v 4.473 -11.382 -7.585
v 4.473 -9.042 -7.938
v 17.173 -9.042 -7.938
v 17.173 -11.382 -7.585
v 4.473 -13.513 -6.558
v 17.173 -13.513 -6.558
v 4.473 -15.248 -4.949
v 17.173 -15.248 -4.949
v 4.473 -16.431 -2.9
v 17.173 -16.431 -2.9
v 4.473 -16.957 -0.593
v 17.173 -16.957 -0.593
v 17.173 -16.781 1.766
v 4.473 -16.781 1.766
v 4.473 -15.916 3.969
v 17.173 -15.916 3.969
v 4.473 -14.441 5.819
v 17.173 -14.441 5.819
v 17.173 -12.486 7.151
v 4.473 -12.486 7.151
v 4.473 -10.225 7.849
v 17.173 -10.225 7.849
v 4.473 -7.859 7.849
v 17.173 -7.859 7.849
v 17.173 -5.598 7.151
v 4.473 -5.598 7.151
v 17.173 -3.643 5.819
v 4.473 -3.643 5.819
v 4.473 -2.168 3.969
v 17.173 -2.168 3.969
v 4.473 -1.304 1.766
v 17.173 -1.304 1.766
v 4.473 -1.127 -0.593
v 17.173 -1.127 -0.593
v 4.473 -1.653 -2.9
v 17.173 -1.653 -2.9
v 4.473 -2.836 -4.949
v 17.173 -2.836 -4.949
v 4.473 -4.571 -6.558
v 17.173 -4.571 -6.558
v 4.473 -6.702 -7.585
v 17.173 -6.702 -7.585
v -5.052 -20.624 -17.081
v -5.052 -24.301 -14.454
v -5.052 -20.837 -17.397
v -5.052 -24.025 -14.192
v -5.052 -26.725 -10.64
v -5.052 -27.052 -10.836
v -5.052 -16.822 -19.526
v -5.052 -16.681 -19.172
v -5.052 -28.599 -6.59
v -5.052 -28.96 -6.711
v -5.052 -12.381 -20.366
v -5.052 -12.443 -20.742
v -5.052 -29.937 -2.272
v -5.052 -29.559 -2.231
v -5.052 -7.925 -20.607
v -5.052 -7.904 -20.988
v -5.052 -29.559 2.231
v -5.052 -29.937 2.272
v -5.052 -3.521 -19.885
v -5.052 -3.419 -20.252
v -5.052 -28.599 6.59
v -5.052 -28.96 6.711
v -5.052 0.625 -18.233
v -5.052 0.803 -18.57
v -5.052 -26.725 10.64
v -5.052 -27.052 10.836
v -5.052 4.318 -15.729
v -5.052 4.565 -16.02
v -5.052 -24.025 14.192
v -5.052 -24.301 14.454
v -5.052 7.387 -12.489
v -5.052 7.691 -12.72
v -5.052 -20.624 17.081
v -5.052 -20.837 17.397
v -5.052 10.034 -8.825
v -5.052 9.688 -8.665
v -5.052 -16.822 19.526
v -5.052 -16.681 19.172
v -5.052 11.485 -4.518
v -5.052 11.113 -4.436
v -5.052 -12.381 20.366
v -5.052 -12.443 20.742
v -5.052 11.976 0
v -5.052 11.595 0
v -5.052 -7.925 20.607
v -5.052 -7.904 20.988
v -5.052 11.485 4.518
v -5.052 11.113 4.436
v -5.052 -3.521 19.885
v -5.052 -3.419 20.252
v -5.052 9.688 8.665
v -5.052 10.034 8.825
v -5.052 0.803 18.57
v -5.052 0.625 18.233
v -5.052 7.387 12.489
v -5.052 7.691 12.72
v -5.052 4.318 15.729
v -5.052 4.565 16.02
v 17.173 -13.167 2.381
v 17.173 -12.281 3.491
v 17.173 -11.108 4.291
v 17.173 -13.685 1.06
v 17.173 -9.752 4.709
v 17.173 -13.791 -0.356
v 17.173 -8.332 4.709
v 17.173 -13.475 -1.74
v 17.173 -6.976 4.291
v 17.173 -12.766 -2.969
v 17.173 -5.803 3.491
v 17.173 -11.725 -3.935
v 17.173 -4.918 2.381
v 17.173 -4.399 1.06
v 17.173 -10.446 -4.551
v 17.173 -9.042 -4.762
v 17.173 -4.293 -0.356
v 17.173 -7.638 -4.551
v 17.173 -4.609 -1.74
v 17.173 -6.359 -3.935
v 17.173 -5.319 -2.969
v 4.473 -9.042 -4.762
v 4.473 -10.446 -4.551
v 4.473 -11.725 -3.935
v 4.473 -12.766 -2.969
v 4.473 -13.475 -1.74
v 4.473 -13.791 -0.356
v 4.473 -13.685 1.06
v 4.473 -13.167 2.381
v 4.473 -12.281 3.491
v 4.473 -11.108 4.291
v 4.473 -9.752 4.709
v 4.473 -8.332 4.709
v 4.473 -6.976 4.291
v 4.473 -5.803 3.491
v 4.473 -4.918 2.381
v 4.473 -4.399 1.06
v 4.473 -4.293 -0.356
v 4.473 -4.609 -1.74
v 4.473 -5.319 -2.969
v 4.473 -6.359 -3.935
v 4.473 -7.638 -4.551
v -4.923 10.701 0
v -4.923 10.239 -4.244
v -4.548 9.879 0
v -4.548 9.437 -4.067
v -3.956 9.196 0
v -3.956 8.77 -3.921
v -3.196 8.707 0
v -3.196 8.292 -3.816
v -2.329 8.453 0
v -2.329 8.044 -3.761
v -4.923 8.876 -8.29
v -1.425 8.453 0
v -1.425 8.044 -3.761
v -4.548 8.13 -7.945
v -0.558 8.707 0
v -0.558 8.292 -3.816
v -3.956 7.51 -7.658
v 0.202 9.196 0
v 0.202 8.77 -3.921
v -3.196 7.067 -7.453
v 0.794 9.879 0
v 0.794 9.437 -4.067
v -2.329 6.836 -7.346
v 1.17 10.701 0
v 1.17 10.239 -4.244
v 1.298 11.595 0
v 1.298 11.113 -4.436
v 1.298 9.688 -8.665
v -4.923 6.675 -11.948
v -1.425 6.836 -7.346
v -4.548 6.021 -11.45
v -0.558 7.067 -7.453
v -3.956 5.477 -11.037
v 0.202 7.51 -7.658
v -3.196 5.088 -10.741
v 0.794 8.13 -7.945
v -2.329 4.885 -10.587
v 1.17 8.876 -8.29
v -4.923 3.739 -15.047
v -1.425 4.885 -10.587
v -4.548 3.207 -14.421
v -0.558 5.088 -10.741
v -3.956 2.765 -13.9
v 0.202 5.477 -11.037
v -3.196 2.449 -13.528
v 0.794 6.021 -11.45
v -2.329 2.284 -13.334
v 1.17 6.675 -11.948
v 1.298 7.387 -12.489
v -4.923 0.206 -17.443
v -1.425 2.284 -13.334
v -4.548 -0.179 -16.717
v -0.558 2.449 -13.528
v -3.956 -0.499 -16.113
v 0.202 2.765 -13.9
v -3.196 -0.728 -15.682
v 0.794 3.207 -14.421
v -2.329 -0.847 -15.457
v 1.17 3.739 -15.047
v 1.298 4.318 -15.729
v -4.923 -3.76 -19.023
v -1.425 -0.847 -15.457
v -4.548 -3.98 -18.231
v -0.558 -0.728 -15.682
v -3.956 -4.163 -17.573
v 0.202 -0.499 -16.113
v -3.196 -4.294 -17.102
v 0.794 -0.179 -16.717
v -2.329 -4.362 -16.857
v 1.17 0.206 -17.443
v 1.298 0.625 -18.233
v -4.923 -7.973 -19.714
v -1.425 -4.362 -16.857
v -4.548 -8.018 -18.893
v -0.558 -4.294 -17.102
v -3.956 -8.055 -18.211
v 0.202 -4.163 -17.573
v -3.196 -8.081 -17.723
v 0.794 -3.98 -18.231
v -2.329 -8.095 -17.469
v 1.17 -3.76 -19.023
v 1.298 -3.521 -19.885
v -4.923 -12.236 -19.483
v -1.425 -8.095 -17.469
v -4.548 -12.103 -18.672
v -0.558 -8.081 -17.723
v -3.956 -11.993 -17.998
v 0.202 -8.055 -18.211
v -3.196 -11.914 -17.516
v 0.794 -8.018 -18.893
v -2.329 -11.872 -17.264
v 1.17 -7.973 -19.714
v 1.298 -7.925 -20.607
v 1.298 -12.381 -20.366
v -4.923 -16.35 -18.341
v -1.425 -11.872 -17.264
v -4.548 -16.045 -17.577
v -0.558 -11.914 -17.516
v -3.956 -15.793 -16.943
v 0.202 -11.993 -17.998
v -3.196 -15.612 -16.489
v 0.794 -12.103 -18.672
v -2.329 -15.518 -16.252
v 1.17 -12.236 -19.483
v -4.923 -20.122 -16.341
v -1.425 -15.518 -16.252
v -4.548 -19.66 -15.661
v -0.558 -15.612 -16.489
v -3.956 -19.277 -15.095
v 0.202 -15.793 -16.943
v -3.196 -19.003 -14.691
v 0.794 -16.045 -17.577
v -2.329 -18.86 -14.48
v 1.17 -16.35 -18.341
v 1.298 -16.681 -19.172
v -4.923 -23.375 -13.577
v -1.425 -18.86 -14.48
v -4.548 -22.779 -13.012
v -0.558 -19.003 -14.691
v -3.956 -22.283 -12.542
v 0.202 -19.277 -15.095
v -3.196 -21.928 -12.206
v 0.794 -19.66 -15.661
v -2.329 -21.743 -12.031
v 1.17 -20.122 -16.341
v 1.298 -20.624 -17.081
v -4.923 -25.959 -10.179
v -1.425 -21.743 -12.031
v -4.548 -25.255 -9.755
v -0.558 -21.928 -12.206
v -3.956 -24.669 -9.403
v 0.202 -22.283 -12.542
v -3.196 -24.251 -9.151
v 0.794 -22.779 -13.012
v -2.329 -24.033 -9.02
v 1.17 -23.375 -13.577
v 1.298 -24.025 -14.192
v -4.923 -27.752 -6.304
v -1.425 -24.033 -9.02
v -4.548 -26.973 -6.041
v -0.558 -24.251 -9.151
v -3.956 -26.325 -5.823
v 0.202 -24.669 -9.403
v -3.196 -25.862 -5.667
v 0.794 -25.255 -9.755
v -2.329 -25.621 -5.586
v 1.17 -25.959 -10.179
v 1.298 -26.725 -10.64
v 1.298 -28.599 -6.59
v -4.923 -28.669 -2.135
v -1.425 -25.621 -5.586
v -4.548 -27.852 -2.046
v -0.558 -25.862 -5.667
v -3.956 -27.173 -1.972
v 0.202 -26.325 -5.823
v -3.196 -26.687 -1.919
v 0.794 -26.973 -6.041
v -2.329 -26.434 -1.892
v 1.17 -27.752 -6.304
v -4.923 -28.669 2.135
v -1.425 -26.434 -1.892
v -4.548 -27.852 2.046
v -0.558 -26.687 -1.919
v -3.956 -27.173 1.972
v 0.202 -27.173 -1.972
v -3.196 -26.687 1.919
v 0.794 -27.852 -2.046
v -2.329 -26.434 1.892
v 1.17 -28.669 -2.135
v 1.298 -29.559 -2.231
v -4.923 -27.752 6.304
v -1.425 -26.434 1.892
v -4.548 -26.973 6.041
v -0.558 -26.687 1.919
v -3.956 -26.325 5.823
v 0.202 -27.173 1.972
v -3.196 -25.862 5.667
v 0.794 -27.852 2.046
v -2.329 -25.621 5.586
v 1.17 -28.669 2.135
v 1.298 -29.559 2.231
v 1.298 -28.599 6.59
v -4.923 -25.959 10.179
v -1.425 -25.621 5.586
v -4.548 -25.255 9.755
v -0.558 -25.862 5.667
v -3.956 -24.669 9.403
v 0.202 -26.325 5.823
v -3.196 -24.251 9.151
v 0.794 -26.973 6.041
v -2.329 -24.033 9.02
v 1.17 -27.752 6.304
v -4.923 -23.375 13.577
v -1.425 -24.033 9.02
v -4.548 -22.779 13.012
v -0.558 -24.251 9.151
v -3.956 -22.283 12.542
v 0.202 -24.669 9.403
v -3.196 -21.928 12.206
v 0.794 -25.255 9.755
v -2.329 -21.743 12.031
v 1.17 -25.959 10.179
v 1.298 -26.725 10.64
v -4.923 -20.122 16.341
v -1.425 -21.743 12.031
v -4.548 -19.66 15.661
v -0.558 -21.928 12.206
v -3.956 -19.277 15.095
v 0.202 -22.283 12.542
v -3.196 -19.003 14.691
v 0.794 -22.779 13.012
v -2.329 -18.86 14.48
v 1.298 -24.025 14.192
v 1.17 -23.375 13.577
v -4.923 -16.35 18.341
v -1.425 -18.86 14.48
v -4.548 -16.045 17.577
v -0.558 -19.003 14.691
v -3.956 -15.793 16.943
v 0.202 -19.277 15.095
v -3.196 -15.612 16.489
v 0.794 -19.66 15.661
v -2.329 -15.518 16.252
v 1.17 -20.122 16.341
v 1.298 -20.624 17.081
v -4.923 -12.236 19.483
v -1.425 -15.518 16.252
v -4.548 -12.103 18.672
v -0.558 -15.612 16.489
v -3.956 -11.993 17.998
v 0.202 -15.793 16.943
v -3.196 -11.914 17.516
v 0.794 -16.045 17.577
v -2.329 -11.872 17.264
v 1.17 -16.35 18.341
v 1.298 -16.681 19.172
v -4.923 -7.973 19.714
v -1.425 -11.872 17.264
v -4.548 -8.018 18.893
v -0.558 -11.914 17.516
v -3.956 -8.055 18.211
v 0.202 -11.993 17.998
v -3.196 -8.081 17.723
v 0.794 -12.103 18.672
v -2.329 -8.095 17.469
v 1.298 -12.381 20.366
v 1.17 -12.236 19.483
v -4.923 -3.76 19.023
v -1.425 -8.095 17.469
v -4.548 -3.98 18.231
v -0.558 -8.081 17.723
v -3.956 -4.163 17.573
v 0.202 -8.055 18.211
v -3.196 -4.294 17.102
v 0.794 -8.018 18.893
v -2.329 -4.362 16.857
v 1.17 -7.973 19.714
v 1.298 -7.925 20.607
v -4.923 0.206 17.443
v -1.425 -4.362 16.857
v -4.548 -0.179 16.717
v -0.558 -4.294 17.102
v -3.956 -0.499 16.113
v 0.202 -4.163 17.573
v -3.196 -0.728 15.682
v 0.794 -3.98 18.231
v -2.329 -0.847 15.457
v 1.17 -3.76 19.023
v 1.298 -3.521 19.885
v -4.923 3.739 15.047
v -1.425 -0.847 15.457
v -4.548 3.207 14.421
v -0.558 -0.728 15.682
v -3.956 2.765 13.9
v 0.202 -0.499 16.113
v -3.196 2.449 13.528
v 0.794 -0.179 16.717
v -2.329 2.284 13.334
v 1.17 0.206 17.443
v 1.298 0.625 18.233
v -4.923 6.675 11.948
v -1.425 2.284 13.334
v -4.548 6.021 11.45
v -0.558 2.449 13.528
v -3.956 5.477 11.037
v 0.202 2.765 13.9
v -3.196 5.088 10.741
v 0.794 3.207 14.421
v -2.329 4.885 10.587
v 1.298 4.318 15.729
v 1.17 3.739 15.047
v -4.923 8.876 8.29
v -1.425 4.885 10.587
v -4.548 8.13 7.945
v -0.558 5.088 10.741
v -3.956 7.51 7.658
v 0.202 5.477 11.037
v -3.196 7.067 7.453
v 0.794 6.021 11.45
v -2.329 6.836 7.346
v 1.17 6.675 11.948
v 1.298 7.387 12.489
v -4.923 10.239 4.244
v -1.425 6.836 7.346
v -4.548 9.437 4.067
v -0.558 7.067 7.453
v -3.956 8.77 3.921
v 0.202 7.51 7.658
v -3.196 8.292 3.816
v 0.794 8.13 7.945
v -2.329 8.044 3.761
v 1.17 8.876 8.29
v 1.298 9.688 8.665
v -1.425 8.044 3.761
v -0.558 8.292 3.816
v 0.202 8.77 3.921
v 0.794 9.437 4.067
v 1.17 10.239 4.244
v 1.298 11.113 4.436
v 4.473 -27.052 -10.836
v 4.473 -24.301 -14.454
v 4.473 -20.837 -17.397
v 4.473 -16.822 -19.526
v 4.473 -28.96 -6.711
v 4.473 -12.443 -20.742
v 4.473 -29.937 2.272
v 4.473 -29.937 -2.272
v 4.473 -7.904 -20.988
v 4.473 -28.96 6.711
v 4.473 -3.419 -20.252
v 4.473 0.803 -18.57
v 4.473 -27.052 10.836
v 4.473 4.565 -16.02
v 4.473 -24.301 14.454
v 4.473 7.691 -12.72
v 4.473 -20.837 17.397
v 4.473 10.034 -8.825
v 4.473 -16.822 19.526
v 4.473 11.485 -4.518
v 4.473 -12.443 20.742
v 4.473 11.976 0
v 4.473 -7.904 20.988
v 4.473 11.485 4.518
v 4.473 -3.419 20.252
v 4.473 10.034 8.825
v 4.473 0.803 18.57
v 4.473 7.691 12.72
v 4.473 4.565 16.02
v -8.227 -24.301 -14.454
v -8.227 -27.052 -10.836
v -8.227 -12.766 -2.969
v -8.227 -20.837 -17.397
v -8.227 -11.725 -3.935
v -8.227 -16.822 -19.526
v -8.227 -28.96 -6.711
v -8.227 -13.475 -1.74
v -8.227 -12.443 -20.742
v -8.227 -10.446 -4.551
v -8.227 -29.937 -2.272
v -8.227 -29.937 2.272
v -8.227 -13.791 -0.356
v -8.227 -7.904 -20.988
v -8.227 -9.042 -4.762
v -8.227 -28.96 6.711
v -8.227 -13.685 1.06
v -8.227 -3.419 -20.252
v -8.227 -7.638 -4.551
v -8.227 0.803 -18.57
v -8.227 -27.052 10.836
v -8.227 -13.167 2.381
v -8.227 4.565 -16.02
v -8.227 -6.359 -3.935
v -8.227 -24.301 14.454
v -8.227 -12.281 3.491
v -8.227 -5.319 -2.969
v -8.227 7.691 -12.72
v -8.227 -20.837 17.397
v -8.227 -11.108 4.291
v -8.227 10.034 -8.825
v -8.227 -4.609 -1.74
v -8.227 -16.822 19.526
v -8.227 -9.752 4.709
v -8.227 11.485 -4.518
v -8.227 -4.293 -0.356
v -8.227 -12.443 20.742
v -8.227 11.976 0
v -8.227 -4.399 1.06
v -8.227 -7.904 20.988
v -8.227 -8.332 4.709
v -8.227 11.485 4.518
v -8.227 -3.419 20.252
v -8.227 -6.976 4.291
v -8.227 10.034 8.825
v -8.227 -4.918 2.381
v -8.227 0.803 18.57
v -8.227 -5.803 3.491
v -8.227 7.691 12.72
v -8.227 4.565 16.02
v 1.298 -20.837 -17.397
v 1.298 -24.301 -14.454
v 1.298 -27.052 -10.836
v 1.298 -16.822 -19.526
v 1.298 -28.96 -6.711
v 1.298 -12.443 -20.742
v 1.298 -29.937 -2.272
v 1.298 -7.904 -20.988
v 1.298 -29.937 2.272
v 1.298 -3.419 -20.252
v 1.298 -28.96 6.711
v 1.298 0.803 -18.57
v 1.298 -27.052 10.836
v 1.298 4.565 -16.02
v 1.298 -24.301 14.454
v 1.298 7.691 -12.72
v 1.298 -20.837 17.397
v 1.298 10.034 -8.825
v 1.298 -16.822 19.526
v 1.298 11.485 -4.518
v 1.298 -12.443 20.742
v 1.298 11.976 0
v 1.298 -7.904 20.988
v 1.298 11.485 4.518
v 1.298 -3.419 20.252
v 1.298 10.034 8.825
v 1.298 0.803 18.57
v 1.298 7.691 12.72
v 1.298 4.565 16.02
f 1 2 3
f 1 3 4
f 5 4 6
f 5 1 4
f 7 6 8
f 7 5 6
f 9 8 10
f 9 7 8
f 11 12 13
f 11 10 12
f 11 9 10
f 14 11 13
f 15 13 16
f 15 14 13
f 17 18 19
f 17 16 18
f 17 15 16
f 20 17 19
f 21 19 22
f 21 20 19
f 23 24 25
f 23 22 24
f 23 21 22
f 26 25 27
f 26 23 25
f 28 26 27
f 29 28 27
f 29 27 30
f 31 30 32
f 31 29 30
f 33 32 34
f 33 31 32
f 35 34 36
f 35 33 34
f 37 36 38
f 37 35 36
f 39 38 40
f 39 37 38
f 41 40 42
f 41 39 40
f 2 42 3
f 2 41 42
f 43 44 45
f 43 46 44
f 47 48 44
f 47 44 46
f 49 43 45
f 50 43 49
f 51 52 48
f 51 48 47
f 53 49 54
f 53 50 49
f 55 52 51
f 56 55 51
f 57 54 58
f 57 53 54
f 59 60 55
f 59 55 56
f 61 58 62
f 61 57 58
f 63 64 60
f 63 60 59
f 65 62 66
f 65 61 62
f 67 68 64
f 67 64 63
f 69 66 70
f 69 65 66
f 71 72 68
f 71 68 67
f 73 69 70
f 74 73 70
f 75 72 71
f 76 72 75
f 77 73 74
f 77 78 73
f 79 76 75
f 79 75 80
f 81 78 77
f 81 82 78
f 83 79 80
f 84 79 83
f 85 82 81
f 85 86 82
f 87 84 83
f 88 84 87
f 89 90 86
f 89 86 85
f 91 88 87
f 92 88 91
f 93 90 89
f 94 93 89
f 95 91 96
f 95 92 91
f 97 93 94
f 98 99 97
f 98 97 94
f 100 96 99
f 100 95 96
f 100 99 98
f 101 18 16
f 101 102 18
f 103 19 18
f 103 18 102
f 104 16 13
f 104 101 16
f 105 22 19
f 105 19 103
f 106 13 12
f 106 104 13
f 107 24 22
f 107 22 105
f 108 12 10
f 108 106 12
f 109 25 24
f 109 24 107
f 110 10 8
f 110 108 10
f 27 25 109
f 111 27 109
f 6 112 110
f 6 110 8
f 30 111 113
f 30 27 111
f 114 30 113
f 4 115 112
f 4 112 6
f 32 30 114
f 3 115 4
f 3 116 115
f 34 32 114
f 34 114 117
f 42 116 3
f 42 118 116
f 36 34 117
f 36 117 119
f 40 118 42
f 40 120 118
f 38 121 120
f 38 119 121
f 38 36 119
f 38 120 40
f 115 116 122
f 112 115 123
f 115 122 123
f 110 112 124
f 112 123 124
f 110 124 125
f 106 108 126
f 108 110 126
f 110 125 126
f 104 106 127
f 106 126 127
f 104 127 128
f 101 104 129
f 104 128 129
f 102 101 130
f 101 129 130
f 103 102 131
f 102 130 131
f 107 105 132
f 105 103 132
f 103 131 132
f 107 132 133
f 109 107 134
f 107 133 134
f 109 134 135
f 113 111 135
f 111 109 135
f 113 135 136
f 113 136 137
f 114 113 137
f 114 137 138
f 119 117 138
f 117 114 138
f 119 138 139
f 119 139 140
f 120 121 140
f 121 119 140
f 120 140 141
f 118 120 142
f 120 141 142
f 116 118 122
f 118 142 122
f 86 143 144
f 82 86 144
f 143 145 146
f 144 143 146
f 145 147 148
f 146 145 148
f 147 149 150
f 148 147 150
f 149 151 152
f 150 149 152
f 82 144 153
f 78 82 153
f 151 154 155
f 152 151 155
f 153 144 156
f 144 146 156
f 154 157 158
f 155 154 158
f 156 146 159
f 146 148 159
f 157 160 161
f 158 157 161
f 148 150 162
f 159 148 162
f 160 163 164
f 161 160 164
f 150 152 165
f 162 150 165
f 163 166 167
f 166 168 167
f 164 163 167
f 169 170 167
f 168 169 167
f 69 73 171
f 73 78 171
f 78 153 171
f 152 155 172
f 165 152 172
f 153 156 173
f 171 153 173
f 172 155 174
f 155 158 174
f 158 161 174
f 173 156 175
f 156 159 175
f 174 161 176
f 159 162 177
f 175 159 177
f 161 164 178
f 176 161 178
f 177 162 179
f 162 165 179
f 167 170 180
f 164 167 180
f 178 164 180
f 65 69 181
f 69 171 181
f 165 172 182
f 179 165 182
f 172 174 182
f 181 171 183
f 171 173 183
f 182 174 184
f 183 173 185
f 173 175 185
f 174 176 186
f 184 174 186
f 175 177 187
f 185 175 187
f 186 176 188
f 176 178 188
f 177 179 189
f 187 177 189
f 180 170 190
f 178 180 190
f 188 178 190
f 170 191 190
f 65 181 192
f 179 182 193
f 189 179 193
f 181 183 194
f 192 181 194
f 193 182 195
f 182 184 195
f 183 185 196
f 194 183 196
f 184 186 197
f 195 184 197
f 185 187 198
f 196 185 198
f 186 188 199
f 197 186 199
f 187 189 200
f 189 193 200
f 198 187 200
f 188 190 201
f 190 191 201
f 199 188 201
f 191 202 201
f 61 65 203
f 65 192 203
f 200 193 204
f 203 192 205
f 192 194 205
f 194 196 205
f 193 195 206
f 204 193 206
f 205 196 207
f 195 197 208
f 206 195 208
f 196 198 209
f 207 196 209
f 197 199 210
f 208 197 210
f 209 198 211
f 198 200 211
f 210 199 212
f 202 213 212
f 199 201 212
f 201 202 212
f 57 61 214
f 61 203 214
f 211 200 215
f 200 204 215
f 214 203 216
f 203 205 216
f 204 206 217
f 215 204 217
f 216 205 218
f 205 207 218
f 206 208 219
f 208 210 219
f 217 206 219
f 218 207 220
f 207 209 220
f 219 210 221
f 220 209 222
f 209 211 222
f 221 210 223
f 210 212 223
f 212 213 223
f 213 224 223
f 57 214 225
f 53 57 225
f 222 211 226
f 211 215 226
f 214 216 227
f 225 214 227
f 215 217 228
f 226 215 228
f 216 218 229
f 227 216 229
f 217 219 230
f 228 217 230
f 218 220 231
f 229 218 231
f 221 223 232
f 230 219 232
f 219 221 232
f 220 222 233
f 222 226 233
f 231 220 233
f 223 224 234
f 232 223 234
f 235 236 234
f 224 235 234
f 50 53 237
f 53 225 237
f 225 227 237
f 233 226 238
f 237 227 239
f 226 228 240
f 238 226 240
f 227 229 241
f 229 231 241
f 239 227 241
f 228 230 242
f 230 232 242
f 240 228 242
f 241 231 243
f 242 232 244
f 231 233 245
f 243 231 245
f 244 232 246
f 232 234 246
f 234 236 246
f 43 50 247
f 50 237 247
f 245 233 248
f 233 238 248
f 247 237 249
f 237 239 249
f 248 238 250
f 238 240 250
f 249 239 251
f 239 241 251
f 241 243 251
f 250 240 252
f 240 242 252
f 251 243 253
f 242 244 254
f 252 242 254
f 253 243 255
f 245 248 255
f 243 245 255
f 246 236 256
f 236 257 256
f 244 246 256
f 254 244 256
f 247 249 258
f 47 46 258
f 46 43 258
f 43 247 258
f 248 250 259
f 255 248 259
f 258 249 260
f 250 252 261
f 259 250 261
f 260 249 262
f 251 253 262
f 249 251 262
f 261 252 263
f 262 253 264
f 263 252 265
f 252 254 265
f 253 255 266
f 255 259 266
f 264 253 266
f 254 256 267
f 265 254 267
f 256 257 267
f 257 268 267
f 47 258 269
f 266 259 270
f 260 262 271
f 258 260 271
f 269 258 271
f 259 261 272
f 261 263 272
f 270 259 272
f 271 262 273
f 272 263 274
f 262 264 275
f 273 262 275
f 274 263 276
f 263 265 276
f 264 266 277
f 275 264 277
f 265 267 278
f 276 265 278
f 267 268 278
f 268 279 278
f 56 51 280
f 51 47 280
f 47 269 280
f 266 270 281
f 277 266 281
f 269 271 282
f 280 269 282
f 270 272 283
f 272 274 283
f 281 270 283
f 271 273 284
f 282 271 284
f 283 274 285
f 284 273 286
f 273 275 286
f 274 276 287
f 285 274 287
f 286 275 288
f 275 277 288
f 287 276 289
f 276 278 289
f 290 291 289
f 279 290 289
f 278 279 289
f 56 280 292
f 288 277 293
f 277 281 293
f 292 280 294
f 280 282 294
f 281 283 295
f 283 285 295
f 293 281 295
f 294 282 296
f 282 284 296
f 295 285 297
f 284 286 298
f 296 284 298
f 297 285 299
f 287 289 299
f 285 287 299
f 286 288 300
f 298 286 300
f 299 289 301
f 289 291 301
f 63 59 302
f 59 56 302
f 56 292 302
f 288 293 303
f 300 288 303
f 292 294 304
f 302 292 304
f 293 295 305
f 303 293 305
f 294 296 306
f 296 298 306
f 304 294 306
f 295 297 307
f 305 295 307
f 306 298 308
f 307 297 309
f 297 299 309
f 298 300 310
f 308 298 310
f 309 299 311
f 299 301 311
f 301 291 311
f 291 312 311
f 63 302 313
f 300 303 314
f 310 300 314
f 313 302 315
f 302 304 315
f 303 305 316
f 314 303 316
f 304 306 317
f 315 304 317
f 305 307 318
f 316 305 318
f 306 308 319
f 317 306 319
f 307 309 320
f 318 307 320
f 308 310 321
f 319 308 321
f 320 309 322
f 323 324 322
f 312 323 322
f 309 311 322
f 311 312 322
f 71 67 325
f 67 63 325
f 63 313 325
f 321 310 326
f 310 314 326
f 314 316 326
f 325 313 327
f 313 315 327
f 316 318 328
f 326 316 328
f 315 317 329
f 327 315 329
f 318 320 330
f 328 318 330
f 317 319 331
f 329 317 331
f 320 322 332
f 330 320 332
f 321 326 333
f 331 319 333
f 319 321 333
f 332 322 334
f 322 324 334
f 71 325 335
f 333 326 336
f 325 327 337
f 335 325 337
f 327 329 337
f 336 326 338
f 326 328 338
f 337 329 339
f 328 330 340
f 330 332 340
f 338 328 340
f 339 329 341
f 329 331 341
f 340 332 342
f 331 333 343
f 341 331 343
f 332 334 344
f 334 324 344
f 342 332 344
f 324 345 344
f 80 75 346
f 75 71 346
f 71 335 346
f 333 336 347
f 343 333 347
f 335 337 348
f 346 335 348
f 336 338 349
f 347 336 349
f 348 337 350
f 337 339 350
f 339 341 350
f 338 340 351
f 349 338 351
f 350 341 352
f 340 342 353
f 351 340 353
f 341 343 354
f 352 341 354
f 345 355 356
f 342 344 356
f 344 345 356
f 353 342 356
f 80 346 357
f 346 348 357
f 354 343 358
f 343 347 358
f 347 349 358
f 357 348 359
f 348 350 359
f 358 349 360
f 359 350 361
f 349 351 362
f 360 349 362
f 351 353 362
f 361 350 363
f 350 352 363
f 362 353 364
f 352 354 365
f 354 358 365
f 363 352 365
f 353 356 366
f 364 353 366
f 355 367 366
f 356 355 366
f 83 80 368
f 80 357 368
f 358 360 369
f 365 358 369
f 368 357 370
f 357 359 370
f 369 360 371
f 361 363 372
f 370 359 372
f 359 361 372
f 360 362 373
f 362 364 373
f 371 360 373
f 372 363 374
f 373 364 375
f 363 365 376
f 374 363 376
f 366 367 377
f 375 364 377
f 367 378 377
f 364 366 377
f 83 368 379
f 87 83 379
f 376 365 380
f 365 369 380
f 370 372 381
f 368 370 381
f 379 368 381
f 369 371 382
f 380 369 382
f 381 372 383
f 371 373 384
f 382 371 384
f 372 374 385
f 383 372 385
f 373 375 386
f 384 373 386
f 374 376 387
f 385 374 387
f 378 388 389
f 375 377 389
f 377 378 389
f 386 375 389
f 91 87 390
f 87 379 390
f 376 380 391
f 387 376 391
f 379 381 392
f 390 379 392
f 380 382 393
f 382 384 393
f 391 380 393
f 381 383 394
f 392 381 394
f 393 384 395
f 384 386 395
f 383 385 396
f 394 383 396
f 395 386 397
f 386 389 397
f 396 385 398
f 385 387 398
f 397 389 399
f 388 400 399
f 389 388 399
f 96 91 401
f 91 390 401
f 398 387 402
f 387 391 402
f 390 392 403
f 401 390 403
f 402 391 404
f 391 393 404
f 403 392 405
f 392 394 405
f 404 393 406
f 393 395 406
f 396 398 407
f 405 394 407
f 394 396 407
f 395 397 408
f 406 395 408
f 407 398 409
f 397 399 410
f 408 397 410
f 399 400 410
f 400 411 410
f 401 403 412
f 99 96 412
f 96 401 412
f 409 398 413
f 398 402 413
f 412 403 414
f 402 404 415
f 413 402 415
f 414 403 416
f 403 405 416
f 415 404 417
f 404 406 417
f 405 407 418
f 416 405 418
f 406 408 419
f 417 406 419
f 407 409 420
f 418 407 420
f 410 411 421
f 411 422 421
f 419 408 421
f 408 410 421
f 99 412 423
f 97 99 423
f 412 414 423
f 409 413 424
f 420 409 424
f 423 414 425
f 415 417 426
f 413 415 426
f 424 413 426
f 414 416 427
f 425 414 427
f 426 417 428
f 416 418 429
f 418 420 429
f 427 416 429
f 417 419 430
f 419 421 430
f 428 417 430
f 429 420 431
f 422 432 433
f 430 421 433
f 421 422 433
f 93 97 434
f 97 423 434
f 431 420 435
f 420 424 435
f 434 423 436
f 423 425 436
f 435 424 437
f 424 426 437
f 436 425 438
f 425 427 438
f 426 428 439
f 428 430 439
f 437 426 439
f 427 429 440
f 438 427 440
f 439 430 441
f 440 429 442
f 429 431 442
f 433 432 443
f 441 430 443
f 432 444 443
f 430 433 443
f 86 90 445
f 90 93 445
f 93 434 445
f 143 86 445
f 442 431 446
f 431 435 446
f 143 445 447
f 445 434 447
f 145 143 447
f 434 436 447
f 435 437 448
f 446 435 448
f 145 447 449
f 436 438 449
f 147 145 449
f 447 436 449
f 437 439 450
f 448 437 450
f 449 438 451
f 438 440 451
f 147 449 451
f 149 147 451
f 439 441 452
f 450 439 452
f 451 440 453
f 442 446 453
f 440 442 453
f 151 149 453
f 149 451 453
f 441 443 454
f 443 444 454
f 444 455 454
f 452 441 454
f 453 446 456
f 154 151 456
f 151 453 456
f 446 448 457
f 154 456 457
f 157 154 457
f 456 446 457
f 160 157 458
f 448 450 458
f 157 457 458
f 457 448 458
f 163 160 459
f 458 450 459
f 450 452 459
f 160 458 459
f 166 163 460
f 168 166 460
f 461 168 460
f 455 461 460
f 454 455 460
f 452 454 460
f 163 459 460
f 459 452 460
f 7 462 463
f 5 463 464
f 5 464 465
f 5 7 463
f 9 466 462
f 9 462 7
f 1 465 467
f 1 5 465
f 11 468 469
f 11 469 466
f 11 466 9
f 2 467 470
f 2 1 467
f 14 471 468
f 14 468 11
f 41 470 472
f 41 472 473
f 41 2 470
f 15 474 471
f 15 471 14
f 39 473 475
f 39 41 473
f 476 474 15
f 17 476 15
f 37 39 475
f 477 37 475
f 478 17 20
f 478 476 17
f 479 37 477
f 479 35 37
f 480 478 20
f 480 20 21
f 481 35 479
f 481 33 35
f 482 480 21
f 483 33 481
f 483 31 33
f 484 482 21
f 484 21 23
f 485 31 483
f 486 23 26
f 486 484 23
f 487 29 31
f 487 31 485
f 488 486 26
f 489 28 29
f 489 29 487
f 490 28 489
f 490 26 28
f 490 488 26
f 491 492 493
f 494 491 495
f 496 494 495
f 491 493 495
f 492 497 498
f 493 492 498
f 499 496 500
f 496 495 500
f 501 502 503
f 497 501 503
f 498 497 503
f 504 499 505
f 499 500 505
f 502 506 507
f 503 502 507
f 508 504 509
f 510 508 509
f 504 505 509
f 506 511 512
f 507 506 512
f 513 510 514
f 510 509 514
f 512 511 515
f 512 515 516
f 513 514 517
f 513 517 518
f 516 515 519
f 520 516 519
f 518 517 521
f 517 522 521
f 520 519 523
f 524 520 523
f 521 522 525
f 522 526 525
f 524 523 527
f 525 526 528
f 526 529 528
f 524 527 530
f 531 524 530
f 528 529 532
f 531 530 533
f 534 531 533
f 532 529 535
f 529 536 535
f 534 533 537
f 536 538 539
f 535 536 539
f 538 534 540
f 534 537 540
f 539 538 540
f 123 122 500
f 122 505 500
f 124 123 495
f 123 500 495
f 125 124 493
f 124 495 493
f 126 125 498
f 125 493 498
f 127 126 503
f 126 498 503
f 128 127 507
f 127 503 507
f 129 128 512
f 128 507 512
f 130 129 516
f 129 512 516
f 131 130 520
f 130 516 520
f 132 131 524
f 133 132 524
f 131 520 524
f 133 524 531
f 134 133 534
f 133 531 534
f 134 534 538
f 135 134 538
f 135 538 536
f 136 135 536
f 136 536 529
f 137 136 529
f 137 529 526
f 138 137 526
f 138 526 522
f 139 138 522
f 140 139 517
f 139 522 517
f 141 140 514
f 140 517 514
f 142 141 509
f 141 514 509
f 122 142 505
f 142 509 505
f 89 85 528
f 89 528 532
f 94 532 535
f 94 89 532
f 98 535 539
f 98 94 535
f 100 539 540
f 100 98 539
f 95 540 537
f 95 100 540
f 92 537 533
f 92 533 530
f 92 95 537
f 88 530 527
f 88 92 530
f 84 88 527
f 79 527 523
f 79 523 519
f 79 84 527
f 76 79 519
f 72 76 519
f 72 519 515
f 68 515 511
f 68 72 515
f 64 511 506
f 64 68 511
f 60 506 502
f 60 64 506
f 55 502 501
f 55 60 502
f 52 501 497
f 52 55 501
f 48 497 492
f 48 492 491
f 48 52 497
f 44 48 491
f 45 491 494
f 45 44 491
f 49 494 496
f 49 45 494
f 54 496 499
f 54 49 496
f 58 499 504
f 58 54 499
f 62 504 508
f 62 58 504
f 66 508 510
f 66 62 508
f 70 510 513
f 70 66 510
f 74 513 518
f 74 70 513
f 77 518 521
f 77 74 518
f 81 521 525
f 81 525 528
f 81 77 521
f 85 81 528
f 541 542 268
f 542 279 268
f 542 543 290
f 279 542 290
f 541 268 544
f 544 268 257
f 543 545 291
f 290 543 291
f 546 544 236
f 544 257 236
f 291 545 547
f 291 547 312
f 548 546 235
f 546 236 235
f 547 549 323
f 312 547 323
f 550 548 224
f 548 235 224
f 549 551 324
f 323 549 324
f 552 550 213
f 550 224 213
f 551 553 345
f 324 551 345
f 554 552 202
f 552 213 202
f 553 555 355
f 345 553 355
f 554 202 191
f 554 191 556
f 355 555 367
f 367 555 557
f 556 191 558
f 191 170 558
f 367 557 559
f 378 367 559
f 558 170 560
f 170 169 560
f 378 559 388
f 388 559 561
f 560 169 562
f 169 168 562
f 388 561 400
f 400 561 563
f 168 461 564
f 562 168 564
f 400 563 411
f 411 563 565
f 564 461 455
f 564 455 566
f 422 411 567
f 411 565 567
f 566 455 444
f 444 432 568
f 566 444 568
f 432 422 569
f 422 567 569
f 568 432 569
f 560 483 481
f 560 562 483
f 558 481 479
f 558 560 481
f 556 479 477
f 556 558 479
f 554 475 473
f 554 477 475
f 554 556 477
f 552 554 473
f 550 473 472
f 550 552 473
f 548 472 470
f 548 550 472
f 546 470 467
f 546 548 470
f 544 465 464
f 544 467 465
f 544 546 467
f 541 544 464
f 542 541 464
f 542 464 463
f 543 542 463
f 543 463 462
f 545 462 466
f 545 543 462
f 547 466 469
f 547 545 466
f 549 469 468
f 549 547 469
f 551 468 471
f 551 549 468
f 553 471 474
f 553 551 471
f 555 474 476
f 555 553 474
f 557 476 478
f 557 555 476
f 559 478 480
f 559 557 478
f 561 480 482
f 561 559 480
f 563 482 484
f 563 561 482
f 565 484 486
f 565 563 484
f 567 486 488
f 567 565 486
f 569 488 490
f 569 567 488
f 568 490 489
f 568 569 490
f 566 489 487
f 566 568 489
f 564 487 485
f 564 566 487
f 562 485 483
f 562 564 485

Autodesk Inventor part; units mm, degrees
ref_plane "YZ Plane" through (0, 0, 0) normal (1, 0, 0) x (0, 1, 0)
ref_plane "XZ Plane" through (0, 0, 0) normal (0, 1, 0) x (-1, 0, 0)
ref_plane "XY Plane" through (0, 0, 0) normal (0, 0, 1) x (1, 0, 0)
sketch "Sketch1" plane through (0, 0, 0) normal (0, 0, 1) x (1, 0, 0)
  line L0 (-8.2268, 11.9764) -> (-8.2268, -9.0421)
  line L1 (-8.2268, -9.0421) -> (4.4732, -9.0421)
  line L2 (4.4732, -9.0421) -> (4.4732, 11.9764)
  line L3 (4.4732, 11.9764) -> (1.2982, 11.9764)
  line L4 (-8.2268, 11.9764) -> (-5.0518, 11.9764)
  line L5 (-5.0518, 11.9764) -> (-5.0518, 11.5954)
  line L6 (1.2982, 11.9764) -> (1.2982, 11.5954)
  arc A0 (-5.0518, 11.5954) -> (1.2982, 11.5954) centre (-1.8768, 11.5954) ccw
  dimension "d0" = 3.175
  dimension "d1" = 12.7
  dimension "d2" = 0.381
  dimension "d5" = 20.6375
  dimension "d6" = 3.175
  dimension "d7" = 21.0185
revolve "Revolution1" add sketch "Sketch1" angle 360 about axis through (-8.2268, -9.0421, 0) along (1, 0, 0)
sketch "Sketch2" plane through (4.4732, -9.0421, 0) normal (1, 0, 0) x (0, 0, -1)
  circle A0 centre (0, 0) radius 21.0185 projected
hole "Hole1" at (4.4732, -9.0421, 0) direction (-1, 0, 0) diameter 9.525 end through all
sketch "Sketch3" plane through (4.4732, -9.0421, 0) normal (1, 0, 0) x (0, 0, -1)
  circle A0 centre (0, 0) radius 4.7625 projected
  circle A1 centre (0, 0) radius 21.0185 projected
  circle A2 centre (0, 0) radius 4.7625
  circle A3 centre (0, 0) radius 7.9375
  dimension "d15" = 3.175
extrude "Extrusion1" add sketch "Sketch3" along normal blind 12.7 contours A3
properties part number "pulley 1.5"
